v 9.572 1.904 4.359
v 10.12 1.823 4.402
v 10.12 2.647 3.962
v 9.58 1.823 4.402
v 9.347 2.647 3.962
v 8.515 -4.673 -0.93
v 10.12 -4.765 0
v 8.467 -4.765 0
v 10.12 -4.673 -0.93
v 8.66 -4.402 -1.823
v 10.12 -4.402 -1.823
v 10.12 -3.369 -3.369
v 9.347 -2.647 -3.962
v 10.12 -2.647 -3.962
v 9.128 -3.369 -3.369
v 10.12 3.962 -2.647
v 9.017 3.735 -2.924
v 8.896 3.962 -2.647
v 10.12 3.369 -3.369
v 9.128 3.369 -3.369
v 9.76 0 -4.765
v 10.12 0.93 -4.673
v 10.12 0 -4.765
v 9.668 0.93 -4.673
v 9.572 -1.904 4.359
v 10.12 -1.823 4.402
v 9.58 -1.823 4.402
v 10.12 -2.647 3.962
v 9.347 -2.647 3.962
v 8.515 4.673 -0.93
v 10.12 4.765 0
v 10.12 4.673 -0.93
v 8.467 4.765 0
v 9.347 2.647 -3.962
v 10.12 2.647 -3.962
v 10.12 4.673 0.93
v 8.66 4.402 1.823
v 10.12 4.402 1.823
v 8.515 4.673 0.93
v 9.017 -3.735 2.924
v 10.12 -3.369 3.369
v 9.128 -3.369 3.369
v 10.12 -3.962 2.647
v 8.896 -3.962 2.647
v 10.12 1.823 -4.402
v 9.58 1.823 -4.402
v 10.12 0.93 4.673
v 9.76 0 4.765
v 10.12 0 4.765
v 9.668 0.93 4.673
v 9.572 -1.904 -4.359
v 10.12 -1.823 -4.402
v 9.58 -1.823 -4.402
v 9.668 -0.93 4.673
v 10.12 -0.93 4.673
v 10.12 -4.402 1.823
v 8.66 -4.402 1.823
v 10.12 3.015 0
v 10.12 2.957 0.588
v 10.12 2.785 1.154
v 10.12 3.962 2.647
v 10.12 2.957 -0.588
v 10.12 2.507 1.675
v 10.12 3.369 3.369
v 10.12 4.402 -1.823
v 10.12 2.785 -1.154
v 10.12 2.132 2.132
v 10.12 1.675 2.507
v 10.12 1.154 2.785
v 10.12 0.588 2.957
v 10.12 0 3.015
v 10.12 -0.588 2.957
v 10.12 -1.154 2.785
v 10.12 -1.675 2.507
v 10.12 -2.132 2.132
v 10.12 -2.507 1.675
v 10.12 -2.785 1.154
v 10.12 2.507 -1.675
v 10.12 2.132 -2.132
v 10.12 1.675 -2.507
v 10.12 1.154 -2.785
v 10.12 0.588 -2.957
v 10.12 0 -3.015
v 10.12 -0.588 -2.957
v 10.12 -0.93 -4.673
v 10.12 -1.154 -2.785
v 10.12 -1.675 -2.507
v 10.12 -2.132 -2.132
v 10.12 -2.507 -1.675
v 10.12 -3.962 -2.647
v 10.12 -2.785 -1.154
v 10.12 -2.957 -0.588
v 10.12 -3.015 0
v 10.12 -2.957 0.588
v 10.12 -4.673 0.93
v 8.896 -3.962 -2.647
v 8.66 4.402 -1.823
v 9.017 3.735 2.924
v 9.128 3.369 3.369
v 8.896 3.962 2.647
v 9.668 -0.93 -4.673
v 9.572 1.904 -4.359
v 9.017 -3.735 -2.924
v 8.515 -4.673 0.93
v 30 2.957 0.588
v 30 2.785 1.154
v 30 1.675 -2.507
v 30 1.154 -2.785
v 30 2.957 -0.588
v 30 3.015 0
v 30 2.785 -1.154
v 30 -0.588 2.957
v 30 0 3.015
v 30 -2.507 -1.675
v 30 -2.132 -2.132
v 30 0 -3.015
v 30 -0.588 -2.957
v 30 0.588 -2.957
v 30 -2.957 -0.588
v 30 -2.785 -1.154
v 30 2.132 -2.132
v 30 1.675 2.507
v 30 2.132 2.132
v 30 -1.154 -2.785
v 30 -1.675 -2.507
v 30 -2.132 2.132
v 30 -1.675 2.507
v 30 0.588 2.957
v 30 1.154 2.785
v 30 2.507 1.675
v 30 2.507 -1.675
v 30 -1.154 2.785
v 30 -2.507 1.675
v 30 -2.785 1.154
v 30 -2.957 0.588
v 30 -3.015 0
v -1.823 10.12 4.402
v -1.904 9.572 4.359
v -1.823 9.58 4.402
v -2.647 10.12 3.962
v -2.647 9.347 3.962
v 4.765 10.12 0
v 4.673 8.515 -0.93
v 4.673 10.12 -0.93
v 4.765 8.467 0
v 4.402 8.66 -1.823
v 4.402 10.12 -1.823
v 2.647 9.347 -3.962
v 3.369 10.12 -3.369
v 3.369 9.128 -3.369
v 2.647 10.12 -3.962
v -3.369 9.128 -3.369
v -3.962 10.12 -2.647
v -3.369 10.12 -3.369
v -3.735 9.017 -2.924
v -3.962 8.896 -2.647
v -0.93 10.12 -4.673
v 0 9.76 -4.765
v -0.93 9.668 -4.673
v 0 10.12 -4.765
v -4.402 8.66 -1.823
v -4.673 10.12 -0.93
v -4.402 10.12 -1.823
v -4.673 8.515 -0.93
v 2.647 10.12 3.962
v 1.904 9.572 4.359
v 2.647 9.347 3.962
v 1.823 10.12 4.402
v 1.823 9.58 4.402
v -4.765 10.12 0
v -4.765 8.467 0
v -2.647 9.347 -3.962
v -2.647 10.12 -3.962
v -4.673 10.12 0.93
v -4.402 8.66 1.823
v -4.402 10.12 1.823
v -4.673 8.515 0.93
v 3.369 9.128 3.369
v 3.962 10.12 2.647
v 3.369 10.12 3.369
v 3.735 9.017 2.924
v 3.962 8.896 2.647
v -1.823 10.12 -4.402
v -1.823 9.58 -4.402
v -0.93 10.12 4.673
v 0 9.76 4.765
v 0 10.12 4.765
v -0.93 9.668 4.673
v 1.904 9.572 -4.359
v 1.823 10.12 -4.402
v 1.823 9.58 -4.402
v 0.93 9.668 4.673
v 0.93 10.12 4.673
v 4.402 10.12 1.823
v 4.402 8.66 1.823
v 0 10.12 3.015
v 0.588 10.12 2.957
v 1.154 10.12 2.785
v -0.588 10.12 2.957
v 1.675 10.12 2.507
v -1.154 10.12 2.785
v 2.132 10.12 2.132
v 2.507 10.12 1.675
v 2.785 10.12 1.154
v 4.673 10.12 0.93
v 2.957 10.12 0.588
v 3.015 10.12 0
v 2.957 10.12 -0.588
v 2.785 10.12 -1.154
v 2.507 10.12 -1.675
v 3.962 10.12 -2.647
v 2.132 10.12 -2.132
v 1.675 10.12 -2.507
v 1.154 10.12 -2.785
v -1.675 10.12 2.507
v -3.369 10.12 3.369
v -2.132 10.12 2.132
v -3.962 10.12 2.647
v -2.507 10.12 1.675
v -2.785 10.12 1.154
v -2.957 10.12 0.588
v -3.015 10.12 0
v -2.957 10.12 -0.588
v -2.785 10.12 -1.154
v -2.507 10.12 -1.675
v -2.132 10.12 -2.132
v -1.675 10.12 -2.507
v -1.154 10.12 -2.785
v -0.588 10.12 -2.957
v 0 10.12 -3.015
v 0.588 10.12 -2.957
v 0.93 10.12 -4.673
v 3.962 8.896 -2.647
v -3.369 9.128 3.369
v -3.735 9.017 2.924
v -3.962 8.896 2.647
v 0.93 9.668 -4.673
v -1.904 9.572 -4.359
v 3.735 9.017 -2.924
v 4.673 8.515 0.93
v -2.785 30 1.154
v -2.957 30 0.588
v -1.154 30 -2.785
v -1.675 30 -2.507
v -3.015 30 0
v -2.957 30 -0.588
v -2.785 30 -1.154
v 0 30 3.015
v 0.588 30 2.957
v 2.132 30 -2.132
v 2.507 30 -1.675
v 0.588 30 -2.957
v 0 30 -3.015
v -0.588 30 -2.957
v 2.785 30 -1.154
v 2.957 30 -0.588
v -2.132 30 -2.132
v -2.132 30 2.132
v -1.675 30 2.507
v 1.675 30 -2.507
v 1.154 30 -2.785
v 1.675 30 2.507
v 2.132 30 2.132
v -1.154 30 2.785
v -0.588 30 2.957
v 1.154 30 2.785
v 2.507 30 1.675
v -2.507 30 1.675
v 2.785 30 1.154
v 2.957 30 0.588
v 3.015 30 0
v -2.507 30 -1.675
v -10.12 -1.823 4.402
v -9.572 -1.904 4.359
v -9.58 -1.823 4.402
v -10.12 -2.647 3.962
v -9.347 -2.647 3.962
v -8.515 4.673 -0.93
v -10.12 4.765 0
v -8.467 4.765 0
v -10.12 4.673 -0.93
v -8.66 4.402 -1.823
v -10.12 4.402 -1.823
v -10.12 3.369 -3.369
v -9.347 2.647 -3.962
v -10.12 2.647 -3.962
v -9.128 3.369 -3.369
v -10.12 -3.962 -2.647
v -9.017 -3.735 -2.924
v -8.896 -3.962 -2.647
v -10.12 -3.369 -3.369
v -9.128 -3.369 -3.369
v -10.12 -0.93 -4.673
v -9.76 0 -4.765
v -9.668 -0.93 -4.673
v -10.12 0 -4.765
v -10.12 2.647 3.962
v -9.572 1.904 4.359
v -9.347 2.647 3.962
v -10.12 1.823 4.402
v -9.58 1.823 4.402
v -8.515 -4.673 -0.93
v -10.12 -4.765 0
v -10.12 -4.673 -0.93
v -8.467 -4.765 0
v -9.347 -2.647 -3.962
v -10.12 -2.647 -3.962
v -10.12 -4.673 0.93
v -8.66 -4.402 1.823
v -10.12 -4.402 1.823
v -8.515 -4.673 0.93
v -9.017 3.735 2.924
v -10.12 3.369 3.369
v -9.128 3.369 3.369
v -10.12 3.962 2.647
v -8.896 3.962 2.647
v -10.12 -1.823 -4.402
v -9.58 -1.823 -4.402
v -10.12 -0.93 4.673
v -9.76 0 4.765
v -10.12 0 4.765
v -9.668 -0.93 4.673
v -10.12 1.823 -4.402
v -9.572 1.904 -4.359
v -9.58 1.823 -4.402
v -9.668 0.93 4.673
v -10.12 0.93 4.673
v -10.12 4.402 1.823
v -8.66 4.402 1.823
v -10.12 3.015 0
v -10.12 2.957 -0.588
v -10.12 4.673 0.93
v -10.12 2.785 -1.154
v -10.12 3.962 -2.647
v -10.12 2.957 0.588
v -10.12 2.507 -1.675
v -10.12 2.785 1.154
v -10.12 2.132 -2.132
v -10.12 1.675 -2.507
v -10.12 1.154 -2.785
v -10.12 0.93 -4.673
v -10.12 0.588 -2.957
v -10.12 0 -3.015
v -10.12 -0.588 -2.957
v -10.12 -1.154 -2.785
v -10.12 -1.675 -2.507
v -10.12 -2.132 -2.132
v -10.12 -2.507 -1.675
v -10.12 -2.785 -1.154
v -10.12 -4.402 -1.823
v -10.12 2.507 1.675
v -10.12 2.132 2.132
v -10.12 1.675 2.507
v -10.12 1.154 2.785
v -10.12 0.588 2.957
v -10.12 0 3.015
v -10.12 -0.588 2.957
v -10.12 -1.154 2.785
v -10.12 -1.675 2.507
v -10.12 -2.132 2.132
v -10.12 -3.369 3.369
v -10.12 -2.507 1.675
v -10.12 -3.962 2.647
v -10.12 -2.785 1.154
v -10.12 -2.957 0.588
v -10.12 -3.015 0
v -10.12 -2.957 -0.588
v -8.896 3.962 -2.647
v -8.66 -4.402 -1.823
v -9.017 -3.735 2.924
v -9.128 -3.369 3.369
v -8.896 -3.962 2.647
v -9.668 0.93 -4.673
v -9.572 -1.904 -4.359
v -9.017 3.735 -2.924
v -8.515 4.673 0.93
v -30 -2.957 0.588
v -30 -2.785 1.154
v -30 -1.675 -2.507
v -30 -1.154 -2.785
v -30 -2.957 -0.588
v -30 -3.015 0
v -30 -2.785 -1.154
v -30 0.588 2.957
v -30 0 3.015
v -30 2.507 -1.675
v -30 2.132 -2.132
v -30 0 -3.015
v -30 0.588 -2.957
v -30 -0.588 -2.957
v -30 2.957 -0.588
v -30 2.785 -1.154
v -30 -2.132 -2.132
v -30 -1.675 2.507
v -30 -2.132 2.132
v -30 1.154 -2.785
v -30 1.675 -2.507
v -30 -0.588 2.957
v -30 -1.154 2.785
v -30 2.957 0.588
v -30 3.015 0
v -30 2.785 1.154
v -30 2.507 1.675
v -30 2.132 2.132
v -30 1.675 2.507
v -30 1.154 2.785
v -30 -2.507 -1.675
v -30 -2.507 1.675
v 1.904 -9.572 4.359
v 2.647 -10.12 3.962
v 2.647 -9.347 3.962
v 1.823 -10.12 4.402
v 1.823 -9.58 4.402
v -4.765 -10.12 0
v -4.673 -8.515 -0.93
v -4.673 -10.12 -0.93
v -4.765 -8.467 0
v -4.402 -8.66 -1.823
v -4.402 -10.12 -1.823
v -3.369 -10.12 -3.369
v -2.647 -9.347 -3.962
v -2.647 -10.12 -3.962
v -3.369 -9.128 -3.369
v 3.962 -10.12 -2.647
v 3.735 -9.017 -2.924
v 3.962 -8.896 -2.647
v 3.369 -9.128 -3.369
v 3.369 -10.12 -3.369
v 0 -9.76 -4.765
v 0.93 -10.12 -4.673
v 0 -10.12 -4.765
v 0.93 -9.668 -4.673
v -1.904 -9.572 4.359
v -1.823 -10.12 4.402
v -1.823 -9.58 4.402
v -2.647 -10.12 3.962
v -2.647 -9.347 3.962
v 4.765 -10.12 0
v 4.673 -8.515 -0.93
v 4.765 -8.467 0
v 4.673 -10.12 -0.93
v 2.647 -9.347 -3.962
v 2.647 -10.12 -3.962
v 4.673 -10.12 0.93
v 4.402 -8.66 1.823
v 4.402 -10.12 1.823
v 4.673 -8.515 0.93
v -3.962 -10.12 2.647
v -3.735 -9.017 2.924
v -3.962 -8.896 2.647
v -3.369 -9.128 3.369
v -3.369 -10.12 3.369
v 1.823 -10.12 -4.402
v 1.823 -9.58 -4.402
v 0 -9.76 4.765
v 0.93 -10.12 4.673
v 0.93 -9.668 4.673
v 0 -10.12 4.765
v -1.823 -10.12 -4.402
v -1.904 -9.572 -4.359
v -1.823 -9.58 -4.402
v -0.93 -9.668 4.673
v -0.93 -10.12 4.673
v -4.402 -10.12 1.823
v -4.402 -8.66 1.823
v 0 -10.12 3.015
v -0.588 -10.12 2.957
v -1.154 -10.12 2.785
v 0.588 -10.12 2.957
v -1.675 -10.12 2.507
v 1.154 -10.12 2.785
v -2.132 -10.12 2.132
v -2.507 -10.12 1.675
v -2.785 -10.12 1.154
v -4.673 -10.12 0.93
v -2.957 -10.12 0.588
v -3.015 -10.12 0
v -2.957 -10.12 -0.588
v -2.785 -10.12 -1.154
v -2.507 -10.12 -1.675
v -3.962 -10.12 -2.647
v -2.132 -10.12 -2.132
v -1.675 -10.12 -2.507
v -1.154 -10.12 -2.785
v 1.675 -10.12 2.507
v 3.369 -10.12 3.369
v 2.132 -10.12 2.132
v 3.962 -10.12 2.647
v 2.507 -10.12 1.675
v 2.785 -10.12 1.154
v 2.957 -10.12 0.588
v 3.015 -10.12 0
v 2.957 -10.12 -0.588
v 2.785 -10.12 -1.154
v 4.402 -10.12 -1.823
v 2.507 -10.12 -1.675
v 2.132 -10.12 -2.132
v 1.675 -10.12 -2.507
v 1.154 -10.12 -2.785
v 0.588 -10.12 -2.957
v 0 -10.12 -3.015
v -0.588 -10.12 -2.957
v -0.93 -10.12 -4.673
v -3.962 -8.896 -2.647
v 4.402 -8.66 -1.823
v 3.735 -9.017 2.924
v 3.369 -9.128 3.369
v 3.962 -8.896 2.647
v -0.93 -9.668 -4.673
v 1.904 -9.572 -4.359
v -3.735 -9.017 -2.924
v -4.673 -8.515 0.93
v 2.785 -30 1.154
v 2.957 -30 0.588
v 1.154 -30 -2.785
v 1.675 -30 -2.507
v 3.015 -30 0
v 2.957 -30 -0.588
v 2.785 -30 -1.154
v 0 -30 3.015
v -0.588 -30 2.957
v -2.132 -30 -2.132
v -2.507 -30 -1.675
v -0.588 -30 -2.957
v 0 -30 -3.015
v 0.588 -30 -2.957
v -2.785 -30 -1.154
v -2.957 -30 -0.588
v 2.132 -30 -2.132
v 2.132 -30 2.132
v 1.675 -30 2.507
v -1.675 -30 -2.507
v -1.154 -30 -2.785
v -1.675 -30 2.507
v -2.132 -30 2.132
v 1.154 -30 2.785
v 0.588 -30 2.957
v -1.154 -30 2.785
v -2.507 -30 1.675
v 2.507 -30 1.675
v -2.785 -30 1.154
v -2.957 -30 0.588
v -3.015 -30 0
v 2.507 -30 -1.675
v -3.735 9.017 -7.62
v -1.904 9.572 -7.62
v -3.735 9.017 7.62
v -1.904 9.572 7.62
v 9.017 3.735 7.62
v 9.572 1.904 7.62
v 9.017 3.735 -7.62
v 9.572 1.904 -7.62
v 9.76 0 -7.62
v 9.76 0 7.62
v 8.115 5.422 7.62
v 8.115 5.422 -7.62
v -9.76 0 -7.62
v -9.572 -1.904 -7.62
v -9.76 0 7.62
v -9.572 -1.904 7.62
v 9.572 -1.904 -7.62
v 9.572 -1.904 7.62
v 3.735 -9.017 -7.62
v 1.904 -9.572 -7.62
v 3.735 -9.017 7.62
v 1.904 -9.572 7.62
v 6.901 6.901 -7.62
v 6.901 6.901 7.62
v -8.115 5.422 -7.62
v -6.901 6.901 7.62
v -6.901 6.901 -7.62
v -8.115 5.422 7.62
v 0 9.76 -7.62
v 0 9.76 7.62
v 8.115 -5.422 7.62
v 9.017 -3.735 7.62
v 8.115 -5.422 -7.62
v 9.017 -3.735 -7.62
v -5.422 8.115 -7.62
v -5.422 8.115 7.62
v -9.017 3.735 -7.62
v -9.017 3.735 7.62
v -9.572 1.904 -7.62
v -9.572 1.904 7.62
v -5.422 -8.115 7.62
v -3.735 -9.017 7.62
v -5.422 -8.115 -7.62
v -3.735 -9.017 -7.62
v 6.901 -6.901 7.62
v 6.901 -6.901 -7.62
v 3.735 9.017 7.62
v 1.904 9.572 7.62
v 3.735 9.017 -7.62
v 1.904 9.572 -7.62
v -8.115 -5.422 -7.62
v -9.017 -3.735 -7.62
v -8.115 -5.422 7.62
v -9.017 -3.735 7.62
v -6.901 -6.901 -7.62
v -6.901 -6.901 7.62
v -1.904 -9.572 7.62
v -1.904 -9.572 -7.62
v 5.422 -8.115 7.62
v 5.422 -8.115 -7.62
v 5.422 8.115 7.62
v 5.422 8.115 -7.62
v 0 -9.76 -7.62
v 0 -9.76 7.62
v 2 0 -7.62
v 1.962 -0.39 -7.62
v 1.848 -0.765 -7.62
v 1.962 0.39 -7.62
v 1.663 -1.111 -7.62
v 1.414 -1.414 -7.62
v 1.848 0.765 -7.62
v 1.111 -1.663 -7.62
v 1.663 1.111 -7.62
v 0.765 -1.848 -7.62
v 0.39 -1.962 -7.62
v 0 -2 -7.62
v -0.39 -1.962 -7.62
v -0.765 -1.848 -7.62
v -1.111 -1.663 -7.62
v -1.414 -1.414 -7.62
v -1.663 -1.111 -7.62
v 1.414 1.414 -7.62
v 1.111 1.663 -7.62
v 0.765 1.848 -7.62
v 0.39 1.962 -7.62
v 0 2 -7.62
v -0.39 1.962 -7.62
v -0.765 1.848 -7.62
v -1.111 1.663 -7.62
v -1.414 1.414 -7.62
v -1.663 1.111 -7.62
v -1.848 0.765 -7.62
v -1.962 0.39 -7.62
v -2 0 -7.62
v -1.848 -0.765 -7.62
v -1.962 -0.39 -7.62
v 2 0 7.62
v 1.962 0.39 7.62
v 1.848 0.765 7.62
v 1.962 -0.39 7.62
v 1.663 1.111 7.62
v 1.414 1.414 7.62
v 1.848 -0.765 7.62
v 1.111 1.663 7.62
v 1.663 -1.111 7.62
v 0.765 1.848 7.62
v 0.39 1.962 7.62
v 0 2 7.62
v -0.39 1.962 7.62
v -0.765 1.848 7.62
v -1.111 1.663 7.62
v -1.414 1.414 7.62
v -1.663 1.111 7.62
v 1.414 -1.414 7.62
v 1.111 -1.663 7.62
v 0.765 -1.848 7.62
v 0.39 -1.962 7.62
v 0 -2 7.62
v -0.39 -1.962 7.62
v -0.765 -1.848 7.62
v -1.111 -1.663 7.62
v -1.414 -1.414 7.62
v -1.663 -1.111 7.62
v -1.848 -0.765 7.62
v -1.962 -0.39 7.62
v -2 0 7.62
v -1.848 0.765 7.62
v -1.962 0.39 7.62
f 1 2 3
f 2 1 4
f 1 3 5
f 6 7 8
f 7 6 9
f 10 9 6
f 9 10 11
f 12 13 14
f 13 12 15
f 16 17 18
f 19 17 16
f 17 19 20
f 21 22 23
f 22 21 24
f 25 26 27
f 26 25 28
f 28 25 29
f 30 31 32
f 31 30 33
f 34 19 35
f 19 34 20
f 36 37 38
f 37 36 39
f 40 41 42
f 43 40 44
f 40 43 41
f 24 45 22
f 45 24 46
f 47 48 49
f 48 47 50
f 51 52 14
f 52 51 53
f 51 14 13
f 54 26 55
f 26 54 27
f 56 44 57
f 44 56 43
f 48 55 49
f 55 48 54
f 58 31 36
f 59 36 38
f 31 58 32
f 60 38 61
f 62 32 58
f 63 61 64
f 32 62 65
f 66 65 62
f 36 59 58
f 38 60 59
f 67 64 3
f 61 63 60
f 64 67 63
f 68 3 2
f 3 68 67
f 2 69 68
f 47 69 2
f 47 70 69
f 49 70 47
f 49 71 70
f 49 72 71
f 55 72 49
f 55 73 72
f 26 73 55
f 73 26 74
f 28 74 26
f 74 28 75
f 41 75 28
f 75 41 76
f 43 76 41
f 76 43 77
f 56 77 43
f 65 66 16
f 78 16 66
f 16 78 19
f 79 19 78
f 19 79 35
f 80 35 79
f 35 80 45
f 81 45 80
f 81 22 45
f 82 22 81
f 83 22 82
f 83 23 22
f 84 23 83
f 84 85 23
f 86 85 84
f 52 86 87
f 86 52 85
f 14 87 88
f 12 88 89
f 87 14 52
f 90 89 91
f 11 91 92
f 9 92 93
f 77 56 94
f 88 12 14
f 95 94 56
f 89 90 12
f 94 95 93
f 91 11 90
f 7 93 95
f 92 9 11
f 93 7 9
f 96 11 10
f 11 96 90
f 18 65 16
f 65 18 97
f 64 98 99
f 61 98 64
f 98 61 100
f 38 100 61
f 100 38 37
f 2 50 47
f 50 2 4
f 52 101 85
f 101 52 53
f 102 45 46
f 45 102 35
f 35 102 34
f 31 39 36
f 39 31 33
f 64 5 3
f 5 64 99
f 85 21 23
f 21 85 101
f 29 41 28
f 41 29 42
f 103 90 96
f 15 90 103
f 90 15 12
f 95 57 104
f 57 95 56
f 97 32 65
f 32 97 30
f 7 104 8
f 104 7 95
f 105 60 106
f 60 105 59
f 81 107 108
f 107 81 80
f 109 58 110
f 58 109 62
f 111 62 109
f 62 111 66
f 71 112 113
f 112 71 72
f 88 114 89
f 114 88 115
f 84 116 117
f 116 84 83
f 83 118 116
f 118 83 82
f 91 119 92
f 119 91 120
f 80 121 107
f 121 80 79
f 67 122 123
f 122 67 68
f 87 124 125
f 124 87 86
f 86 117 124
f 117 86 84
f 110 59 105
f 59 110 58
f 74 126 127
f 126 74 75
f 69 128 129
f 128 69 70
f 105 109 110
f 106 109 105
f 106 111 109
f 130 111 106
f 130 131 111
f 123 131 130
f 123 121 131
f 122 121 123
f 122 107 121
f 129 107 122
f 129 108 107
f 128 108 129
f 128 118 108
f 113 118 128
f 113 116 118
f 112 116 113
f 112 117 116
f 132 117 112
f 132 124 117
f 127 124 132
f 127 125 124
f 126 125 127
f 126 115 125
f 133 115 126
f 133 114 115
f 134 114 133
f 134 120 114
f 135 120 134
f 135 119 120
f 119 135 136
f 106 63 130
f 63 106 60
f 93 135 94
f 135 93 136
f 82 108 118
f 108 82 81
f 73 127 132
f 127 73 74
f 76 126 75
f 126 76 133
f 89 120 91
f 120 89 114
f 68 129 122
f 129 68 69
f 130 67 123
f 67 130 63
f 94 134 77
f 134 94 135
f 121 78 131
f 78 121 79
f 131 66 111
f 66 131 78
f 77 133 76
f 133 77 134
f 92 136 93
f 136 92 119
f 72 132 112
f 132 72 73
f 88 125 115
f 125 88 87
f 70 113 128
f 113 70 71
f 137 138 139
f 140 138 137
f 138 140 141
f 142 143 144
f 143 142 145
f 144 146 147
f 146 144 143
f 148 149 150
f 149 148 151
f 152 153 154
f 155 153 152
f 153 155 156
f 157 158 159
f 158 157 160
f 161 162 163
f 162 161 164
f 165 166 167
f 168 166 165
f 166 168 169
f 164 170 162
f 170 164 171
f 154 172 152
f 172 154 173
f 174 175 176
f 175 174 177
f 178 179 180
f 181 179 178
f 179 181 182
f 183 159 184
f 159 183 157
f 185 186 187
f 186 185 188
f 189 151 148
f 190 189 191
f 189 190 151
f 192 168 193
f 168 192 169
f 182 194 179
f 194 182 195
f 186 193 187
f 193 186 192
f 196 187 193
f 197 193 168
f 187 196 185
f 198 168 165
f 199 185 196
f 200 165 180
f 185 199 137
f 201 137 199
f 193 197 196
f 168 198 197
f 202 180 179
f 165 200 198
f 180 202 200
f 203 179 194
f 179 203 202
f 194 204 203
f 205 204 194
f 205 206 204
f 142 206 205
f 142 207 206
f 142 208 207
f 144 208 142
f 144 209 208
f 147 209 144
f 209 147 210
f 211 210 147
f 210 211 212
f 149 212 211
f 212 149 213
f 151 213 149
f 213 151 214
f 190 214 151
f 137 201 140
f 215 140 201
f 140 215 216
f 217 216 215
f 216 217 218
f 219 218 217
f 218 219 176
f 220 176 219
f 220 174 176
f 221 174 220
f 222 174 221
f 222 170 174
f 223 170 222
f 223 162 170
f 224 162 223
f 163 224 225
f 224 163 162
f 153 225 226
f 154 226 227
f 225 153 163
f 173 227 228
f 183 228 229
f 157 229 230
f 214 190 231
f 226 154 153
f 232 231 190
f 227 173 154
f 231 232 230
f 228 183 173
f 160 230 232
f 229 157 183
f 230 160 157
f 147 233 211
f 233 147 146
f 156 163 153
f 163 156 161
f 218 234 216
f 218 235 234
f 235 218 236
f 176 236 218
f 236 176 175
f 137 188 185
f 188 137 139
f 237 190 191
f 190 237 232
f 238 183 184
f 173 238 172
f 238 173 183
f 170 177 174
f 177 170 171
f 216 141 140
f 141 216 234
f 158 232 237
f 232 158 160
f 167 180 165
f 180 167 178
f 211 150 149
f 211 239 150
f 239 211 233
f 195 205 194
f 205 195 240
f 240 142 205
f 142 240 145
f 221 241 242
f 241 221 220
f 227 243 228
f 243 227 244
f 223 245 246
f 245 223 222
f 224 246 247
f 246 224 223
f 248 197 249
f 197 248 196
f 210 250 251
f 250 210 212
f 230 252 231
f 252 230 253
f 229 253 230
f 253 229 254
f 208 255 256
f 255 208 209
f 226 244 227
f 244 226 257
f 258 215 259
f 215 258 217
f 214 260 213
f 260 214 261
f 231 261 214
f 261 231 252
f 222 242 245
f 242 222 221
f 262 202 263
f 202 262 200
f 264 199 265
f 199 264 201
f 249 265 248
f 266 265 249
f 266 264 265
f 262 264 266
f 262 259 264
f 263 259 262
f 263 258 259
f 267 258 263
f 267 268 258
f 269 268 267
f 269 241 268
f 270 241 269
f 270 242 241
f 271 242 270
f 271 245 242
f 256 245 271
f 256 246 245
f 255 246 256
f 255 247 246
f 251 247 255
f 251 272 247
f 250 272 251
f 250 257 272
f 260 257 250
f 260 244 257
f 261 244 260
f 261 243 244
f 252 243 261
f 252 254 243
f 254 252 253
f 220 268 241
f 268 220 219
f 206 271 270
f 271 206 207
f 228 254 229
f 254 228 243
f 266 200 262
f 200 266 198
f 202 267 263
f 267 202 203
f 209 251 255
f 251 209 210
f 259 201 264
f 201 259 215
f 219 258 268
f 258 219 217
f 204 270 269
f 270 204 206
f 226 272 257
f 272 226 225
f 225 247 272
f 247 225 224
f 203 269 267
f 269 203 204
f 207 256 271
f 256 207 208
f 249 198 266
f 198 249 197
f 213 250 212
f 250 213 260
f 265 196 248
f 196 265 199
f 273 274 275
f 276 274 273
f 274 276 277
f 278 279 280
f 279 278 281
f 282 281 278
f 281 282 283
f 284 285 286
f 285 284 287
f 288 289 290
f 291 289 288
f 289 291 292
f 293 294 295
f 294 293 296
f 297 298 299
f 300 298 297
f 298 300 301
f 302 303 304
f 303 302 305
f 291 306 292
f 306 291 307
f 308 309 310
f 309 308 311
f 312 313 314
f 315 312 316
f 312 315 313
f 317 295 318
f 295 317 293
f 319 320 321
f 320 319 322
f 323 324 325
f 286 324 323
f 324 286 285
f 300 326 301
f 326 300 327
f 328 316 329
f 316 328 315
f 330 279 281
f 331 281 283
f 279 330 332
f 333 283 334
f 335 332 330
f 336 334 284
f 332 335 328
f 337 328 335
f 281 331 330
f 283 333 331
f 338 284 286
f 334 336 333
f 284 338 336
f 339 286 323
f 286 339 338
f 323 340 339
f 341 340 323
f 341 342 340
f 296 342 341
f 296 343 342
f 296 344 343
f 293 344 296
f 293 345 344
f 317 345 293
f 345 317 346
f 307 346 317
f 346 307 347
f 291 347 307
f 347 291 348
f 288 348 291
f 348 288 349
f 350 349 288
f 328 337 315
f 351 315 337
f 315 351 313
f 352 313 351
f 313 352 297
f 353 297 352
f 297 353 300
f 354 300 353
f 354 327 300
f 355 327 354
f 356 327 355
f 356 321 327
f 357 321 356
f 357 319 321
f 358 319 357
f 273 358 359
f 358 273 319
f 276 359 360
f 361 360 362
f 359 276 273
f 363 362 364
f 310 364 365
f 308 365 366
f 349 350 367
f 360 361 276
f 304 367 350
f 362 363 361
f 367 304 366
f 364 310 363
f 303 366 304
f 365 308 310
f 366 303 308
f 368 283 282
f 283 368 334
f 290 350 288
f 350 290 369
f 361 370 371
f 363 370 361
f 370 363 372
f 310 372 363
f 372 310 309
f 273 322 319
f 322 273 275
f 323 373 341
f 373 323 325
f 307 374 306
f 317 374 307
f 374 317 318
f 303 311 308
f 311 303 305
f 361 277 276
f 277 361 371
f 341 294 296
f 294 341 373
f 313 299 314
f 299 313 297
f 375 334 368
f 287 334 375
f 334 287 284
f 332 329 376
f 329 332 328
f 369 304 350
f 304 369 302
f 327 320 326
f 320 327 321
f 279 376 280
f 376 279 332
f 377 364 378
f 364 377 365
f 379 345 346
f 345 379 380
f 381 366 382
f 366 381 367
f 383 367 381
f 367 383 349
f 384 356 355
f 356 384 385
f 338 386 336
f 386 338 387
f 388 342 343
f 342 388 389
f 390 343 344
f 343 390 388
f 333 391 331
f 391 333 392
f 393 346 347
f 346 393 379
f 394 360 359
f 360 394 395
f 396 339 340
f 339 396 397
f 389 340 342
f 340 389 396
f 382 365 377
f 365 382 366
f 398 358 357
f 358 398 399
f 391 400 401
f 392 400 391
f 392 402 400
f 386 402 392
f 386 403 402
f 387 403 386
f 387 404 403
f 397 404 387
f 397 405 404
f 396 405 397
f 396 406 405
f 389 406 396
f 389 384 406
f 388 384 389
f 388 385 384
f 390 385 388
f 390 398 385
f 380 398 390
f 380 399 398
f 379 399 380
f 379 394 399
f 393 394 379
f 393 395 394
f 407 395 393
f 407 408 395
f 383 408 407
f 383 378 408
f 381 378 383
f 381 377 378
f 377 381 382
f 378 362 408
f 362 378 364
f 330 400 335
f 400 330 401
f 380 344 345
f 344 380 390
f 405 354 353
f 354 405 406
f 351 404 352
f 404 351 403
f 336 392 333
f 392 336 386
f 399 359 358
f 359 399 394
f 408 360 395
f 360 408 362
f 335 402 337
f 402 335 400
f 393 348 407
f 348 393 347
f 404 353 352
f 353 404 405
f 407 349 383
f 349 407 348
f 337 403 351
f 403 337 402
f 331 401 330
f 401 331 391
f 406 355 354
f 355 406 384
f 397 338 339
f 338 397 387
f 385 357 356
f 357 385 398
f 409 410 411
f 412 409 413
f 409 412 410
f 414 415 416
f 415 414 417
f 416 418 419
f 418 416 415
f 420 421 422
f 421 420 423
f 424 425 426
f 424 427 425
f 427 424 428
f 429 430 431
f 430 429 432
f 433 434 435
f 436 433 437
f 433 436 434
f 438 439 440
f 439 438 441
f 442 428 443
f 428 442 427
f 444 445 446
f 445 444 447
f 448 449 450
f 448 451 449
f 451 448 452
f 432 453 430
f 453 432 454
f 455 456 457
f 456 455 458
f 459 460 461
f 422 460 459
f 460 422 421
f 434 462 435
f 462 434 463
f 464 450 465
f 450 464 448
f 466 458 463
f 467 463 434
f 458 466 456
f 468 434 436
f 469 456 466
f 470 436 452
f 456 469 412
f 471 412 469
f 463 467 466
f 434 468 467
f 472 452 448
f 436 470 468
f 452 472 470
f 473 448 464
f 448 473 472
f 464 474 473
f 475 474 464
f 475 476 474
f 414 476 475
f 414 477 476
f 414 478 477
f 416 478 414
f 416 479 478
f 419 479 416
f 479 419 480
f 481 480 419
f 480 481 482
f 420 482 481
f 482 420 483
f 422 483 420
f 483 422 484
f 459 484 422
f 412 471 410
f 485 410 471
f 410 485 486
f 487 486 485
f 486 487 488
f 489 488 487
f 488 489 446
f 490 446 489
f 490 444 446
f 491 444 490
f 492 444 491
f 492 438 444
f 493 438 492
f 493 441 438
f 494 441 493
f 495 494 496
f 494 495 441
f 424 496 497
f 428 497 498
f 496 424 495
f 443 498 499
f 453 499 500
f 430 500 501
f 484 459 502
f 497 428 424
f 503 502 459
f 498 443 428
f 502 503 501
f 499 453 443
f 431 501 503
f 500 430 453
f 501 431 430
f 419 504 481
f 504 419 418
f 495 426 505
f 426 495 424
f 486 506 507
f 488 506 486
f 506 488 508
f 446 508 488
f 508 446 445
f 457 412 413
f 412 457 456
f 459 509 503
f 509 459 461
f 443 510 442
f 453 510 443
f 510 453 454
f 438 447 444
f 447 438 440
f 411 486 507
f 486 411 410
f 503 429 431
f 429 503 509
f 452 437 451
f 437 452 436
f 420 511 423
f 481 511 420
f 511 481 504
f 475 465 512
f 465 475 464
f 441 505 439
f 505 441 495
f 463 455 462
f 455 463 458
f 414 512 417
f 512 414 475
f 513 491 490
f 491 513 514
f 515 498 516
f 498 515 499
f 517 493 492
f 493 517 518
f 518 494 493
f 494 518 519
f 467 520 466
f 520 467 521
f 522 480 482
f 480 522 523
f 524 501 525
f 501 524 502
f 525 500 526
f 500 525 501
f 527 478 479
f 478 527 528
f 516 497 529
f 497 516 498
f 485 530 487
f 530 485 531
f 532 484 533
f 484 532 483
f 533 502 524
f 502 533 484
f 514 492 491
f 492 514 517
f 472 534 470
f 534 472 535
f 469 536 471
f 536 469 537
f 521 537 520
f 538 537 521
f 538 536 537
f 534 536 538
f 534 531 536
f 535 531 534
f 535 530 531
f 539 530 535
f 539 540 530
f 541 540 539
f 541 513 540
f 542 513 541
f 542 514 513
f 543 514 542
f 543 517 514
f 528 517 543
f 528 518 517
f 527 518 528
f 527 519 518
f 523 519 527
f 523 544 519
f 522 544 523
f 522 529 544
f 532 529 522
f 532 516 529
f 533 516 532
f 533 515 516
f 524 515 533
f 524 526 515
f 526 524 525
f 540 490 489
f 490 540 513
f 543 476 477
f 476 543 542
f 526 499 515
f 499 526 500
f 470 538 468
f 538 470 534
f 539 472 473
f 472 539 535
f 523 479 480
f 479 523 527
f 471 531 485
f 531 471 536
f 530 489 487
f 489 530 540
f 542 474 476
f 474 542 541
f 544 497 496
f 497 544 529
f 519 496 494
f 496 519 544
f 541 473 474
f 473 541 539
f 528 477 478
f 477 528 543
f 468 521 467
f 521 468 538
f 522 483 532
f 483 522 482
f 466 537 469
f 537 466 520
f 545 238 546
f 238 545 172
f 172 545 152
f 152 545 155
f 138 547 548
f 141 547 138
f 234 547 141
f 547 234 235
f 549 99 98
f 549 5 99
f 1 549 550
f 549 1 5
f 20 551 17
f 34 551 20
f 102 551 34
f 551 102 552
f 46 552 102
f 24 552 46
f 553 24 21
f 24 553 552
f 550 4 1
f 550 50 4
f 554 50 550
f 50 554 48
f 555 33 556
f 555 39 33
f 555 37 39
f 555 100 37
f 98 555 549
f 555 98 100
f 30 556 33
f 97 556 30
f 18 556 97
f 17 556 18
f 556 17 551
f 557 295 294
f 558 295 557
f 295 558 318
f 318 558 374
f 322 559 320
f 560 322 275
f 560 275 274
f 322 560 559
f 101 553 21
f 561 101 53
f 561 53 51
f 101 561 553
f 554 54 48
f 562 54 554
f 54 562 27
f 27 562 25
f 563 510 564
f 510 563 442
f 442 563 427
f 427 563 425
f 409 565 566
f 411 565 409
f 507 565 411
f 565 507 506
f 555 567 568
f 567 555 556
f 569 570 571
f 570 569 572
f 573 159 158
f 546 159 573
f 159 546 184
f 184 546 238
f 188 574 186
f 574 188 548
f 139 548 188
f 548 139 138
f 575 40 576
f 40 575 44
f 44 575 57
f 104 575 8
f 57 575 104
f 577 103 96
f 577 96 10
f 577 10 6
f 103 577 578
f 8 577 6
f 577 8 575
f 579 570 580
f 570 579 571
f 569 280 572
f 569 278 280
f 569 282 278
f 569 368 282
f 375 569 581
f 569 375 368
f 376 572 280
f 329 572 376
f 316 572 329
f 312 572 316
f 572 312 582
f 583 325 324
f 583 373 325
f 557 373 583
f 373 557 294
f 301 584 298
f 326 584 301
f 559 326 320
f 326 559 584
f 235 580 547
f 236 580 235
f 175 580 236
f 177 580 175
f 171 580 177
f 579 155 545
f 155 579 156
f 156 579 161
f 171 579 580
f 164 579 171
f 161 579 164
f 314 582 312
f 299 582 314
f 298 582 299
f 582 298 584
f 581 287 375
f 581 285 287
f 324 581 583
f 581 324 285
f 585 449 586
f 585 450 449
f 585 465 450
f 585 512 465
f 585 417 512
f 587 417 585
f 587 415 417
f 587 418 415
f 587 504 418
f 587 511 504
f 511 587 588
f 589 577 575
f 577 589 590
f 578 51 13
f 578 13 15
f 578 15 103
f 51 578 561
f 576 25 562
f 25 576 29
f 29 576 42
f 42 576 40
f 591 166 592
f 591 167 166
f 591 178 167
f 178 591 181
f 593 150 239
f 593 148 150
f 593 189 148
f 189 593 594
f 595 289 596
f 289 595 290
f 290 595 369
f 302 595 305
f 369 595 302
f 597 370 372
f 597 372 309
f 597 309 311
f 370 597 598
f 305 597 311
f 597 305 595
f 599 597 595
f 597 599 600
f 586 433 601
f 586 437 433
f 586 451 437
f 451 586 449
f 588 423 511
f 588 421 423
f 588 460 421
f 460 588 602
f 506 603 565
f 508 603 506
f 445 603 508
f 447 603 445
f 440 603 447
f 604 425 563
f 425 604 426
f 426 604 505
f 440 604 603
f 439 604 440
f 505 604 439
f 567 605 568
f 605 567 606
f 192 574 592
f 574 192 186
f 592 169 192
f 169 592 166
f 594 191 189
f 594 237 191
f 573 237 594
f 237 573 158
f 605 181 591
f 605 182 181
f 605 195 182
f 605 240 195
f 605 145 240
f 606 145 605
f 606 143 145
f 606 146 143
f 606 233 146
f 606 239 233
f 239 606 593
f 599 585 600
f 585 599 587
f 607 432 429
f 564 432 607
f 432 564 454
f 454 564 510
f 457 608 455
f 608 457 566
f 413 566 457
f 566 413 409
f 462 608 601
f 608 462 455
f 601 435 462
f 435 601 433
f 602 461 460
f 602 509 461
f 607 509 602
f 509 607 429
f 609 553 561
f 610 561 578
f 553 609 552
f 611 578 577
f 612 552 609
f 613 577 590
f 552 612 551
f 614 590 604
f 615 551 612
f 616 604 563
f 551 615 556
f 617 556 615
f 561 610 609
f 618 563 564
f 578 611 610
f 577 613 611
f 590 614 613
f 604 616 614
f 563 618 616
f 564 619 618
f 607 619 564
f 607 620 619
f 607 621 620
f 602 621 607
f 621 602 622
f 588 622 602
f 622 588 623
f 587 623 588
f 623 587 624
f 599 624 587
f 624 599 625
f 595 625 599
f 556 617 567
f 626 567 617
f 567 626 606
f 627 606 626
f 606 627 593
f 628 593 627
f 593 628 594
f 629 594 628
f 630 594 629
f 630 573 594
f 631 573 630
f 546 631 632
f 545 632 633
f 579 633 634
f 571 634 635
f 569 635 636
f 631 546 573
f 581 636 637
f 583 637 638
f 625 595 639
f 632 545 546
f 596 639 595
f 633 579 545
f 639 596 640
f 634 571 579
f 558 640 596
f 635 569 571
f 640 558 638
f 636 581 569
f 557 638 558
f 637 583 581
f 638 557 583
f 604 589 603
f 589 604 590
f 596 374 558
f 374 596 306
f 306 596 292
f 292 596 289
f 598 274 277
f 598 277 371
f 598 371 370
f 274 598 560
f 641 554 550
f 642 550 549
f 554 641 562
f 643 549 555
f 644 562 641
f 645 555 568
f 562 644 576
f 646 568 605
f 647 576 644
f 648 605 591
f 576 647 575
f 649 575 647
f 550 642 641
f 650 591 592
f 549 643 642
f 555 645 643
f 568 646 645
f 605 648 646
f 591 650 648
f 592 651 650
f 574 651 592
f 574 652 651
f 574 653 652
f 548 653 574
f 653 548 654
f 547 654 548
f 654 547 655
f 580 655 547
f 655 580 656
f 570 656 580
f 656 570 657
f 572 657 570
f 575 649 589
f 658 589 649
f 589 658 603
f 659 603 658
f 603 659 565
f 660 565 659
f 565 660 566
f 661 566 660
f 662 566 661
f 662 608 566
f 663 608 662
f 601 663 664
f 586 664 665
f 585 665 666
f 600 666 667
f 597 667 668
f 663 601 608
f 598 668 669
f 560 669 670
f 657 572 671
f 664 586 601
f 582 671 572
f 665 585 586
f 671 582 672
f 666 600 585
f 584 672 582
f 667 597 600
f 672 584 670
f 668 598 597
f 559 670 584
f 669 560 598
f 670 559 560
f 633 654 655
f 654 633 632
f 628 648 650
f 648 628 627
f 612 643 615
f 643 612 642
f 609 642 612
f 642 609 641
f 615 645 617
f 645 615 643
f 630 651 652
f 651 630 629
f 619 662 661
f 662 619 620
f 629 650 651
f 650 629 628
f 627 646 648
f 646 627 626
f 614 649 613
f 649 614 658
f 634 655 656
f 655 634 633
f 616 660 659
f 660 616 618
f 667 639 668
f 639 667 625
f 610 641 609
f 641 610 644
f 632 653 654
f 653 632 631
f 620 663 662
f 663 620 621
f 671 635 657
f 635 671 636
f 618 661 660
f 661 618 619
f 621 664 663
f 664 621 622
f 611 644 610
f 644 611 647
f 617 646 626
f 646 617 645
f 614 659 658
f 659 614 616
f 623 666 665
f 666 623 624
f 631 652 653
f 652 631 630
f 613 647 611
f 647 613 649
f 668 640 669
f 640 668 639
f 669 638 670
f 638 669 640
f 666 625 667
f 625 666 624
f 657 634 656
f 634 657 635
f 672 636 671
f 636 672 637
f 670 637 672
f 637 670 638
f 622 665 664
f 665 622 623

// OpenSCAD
$fn = 32;

// ----------------------------------------------------------------------
// Cardan cross: 60 mm span, 9.53 mm trunnions
// ----------------------------------------------------------------------

// --- parameters (mm) ---
journal_d = 9.53;         // trunnion diameter
arm_len = 30;             // trunnion length from the centre
step_r = 3.24;            // step position from the centre
step_d = 6.03;            // journal diameter after the step
hub_d = 19.52;            // hub diameter
hub_h = 15.24;            // hub height
bore_d = 4;               // hub bore

difference() {
  union() {
    /* hub along the joint axis */
    cylinder(h = hub_h, d = hub_d, center = true);
    for (a = [0 : 90 : 270]) rotate([0, 0, a]) {
      /* trunnion, sunk into the hub */
      translate([hub_d / 4, 0, 0]) rotate([0, 90, 0]) cylinder(h = step_r + 2, d = journal_d);
      /* stepped journal out to the tip */
      translate([step_r - 0.5, 0, 0]) rotate([0, 90, 0]) cylinder(h = arm_len + 0.5 - step_r, d = step_d);
    }
  }
  /* lubrication bore through the hub, 2.5 mm clear on both sides */
  translate([0, 0, -hub_h / 2 - 2.5]) cylinder(h = hub_h + 5, d = bore_d);
}
